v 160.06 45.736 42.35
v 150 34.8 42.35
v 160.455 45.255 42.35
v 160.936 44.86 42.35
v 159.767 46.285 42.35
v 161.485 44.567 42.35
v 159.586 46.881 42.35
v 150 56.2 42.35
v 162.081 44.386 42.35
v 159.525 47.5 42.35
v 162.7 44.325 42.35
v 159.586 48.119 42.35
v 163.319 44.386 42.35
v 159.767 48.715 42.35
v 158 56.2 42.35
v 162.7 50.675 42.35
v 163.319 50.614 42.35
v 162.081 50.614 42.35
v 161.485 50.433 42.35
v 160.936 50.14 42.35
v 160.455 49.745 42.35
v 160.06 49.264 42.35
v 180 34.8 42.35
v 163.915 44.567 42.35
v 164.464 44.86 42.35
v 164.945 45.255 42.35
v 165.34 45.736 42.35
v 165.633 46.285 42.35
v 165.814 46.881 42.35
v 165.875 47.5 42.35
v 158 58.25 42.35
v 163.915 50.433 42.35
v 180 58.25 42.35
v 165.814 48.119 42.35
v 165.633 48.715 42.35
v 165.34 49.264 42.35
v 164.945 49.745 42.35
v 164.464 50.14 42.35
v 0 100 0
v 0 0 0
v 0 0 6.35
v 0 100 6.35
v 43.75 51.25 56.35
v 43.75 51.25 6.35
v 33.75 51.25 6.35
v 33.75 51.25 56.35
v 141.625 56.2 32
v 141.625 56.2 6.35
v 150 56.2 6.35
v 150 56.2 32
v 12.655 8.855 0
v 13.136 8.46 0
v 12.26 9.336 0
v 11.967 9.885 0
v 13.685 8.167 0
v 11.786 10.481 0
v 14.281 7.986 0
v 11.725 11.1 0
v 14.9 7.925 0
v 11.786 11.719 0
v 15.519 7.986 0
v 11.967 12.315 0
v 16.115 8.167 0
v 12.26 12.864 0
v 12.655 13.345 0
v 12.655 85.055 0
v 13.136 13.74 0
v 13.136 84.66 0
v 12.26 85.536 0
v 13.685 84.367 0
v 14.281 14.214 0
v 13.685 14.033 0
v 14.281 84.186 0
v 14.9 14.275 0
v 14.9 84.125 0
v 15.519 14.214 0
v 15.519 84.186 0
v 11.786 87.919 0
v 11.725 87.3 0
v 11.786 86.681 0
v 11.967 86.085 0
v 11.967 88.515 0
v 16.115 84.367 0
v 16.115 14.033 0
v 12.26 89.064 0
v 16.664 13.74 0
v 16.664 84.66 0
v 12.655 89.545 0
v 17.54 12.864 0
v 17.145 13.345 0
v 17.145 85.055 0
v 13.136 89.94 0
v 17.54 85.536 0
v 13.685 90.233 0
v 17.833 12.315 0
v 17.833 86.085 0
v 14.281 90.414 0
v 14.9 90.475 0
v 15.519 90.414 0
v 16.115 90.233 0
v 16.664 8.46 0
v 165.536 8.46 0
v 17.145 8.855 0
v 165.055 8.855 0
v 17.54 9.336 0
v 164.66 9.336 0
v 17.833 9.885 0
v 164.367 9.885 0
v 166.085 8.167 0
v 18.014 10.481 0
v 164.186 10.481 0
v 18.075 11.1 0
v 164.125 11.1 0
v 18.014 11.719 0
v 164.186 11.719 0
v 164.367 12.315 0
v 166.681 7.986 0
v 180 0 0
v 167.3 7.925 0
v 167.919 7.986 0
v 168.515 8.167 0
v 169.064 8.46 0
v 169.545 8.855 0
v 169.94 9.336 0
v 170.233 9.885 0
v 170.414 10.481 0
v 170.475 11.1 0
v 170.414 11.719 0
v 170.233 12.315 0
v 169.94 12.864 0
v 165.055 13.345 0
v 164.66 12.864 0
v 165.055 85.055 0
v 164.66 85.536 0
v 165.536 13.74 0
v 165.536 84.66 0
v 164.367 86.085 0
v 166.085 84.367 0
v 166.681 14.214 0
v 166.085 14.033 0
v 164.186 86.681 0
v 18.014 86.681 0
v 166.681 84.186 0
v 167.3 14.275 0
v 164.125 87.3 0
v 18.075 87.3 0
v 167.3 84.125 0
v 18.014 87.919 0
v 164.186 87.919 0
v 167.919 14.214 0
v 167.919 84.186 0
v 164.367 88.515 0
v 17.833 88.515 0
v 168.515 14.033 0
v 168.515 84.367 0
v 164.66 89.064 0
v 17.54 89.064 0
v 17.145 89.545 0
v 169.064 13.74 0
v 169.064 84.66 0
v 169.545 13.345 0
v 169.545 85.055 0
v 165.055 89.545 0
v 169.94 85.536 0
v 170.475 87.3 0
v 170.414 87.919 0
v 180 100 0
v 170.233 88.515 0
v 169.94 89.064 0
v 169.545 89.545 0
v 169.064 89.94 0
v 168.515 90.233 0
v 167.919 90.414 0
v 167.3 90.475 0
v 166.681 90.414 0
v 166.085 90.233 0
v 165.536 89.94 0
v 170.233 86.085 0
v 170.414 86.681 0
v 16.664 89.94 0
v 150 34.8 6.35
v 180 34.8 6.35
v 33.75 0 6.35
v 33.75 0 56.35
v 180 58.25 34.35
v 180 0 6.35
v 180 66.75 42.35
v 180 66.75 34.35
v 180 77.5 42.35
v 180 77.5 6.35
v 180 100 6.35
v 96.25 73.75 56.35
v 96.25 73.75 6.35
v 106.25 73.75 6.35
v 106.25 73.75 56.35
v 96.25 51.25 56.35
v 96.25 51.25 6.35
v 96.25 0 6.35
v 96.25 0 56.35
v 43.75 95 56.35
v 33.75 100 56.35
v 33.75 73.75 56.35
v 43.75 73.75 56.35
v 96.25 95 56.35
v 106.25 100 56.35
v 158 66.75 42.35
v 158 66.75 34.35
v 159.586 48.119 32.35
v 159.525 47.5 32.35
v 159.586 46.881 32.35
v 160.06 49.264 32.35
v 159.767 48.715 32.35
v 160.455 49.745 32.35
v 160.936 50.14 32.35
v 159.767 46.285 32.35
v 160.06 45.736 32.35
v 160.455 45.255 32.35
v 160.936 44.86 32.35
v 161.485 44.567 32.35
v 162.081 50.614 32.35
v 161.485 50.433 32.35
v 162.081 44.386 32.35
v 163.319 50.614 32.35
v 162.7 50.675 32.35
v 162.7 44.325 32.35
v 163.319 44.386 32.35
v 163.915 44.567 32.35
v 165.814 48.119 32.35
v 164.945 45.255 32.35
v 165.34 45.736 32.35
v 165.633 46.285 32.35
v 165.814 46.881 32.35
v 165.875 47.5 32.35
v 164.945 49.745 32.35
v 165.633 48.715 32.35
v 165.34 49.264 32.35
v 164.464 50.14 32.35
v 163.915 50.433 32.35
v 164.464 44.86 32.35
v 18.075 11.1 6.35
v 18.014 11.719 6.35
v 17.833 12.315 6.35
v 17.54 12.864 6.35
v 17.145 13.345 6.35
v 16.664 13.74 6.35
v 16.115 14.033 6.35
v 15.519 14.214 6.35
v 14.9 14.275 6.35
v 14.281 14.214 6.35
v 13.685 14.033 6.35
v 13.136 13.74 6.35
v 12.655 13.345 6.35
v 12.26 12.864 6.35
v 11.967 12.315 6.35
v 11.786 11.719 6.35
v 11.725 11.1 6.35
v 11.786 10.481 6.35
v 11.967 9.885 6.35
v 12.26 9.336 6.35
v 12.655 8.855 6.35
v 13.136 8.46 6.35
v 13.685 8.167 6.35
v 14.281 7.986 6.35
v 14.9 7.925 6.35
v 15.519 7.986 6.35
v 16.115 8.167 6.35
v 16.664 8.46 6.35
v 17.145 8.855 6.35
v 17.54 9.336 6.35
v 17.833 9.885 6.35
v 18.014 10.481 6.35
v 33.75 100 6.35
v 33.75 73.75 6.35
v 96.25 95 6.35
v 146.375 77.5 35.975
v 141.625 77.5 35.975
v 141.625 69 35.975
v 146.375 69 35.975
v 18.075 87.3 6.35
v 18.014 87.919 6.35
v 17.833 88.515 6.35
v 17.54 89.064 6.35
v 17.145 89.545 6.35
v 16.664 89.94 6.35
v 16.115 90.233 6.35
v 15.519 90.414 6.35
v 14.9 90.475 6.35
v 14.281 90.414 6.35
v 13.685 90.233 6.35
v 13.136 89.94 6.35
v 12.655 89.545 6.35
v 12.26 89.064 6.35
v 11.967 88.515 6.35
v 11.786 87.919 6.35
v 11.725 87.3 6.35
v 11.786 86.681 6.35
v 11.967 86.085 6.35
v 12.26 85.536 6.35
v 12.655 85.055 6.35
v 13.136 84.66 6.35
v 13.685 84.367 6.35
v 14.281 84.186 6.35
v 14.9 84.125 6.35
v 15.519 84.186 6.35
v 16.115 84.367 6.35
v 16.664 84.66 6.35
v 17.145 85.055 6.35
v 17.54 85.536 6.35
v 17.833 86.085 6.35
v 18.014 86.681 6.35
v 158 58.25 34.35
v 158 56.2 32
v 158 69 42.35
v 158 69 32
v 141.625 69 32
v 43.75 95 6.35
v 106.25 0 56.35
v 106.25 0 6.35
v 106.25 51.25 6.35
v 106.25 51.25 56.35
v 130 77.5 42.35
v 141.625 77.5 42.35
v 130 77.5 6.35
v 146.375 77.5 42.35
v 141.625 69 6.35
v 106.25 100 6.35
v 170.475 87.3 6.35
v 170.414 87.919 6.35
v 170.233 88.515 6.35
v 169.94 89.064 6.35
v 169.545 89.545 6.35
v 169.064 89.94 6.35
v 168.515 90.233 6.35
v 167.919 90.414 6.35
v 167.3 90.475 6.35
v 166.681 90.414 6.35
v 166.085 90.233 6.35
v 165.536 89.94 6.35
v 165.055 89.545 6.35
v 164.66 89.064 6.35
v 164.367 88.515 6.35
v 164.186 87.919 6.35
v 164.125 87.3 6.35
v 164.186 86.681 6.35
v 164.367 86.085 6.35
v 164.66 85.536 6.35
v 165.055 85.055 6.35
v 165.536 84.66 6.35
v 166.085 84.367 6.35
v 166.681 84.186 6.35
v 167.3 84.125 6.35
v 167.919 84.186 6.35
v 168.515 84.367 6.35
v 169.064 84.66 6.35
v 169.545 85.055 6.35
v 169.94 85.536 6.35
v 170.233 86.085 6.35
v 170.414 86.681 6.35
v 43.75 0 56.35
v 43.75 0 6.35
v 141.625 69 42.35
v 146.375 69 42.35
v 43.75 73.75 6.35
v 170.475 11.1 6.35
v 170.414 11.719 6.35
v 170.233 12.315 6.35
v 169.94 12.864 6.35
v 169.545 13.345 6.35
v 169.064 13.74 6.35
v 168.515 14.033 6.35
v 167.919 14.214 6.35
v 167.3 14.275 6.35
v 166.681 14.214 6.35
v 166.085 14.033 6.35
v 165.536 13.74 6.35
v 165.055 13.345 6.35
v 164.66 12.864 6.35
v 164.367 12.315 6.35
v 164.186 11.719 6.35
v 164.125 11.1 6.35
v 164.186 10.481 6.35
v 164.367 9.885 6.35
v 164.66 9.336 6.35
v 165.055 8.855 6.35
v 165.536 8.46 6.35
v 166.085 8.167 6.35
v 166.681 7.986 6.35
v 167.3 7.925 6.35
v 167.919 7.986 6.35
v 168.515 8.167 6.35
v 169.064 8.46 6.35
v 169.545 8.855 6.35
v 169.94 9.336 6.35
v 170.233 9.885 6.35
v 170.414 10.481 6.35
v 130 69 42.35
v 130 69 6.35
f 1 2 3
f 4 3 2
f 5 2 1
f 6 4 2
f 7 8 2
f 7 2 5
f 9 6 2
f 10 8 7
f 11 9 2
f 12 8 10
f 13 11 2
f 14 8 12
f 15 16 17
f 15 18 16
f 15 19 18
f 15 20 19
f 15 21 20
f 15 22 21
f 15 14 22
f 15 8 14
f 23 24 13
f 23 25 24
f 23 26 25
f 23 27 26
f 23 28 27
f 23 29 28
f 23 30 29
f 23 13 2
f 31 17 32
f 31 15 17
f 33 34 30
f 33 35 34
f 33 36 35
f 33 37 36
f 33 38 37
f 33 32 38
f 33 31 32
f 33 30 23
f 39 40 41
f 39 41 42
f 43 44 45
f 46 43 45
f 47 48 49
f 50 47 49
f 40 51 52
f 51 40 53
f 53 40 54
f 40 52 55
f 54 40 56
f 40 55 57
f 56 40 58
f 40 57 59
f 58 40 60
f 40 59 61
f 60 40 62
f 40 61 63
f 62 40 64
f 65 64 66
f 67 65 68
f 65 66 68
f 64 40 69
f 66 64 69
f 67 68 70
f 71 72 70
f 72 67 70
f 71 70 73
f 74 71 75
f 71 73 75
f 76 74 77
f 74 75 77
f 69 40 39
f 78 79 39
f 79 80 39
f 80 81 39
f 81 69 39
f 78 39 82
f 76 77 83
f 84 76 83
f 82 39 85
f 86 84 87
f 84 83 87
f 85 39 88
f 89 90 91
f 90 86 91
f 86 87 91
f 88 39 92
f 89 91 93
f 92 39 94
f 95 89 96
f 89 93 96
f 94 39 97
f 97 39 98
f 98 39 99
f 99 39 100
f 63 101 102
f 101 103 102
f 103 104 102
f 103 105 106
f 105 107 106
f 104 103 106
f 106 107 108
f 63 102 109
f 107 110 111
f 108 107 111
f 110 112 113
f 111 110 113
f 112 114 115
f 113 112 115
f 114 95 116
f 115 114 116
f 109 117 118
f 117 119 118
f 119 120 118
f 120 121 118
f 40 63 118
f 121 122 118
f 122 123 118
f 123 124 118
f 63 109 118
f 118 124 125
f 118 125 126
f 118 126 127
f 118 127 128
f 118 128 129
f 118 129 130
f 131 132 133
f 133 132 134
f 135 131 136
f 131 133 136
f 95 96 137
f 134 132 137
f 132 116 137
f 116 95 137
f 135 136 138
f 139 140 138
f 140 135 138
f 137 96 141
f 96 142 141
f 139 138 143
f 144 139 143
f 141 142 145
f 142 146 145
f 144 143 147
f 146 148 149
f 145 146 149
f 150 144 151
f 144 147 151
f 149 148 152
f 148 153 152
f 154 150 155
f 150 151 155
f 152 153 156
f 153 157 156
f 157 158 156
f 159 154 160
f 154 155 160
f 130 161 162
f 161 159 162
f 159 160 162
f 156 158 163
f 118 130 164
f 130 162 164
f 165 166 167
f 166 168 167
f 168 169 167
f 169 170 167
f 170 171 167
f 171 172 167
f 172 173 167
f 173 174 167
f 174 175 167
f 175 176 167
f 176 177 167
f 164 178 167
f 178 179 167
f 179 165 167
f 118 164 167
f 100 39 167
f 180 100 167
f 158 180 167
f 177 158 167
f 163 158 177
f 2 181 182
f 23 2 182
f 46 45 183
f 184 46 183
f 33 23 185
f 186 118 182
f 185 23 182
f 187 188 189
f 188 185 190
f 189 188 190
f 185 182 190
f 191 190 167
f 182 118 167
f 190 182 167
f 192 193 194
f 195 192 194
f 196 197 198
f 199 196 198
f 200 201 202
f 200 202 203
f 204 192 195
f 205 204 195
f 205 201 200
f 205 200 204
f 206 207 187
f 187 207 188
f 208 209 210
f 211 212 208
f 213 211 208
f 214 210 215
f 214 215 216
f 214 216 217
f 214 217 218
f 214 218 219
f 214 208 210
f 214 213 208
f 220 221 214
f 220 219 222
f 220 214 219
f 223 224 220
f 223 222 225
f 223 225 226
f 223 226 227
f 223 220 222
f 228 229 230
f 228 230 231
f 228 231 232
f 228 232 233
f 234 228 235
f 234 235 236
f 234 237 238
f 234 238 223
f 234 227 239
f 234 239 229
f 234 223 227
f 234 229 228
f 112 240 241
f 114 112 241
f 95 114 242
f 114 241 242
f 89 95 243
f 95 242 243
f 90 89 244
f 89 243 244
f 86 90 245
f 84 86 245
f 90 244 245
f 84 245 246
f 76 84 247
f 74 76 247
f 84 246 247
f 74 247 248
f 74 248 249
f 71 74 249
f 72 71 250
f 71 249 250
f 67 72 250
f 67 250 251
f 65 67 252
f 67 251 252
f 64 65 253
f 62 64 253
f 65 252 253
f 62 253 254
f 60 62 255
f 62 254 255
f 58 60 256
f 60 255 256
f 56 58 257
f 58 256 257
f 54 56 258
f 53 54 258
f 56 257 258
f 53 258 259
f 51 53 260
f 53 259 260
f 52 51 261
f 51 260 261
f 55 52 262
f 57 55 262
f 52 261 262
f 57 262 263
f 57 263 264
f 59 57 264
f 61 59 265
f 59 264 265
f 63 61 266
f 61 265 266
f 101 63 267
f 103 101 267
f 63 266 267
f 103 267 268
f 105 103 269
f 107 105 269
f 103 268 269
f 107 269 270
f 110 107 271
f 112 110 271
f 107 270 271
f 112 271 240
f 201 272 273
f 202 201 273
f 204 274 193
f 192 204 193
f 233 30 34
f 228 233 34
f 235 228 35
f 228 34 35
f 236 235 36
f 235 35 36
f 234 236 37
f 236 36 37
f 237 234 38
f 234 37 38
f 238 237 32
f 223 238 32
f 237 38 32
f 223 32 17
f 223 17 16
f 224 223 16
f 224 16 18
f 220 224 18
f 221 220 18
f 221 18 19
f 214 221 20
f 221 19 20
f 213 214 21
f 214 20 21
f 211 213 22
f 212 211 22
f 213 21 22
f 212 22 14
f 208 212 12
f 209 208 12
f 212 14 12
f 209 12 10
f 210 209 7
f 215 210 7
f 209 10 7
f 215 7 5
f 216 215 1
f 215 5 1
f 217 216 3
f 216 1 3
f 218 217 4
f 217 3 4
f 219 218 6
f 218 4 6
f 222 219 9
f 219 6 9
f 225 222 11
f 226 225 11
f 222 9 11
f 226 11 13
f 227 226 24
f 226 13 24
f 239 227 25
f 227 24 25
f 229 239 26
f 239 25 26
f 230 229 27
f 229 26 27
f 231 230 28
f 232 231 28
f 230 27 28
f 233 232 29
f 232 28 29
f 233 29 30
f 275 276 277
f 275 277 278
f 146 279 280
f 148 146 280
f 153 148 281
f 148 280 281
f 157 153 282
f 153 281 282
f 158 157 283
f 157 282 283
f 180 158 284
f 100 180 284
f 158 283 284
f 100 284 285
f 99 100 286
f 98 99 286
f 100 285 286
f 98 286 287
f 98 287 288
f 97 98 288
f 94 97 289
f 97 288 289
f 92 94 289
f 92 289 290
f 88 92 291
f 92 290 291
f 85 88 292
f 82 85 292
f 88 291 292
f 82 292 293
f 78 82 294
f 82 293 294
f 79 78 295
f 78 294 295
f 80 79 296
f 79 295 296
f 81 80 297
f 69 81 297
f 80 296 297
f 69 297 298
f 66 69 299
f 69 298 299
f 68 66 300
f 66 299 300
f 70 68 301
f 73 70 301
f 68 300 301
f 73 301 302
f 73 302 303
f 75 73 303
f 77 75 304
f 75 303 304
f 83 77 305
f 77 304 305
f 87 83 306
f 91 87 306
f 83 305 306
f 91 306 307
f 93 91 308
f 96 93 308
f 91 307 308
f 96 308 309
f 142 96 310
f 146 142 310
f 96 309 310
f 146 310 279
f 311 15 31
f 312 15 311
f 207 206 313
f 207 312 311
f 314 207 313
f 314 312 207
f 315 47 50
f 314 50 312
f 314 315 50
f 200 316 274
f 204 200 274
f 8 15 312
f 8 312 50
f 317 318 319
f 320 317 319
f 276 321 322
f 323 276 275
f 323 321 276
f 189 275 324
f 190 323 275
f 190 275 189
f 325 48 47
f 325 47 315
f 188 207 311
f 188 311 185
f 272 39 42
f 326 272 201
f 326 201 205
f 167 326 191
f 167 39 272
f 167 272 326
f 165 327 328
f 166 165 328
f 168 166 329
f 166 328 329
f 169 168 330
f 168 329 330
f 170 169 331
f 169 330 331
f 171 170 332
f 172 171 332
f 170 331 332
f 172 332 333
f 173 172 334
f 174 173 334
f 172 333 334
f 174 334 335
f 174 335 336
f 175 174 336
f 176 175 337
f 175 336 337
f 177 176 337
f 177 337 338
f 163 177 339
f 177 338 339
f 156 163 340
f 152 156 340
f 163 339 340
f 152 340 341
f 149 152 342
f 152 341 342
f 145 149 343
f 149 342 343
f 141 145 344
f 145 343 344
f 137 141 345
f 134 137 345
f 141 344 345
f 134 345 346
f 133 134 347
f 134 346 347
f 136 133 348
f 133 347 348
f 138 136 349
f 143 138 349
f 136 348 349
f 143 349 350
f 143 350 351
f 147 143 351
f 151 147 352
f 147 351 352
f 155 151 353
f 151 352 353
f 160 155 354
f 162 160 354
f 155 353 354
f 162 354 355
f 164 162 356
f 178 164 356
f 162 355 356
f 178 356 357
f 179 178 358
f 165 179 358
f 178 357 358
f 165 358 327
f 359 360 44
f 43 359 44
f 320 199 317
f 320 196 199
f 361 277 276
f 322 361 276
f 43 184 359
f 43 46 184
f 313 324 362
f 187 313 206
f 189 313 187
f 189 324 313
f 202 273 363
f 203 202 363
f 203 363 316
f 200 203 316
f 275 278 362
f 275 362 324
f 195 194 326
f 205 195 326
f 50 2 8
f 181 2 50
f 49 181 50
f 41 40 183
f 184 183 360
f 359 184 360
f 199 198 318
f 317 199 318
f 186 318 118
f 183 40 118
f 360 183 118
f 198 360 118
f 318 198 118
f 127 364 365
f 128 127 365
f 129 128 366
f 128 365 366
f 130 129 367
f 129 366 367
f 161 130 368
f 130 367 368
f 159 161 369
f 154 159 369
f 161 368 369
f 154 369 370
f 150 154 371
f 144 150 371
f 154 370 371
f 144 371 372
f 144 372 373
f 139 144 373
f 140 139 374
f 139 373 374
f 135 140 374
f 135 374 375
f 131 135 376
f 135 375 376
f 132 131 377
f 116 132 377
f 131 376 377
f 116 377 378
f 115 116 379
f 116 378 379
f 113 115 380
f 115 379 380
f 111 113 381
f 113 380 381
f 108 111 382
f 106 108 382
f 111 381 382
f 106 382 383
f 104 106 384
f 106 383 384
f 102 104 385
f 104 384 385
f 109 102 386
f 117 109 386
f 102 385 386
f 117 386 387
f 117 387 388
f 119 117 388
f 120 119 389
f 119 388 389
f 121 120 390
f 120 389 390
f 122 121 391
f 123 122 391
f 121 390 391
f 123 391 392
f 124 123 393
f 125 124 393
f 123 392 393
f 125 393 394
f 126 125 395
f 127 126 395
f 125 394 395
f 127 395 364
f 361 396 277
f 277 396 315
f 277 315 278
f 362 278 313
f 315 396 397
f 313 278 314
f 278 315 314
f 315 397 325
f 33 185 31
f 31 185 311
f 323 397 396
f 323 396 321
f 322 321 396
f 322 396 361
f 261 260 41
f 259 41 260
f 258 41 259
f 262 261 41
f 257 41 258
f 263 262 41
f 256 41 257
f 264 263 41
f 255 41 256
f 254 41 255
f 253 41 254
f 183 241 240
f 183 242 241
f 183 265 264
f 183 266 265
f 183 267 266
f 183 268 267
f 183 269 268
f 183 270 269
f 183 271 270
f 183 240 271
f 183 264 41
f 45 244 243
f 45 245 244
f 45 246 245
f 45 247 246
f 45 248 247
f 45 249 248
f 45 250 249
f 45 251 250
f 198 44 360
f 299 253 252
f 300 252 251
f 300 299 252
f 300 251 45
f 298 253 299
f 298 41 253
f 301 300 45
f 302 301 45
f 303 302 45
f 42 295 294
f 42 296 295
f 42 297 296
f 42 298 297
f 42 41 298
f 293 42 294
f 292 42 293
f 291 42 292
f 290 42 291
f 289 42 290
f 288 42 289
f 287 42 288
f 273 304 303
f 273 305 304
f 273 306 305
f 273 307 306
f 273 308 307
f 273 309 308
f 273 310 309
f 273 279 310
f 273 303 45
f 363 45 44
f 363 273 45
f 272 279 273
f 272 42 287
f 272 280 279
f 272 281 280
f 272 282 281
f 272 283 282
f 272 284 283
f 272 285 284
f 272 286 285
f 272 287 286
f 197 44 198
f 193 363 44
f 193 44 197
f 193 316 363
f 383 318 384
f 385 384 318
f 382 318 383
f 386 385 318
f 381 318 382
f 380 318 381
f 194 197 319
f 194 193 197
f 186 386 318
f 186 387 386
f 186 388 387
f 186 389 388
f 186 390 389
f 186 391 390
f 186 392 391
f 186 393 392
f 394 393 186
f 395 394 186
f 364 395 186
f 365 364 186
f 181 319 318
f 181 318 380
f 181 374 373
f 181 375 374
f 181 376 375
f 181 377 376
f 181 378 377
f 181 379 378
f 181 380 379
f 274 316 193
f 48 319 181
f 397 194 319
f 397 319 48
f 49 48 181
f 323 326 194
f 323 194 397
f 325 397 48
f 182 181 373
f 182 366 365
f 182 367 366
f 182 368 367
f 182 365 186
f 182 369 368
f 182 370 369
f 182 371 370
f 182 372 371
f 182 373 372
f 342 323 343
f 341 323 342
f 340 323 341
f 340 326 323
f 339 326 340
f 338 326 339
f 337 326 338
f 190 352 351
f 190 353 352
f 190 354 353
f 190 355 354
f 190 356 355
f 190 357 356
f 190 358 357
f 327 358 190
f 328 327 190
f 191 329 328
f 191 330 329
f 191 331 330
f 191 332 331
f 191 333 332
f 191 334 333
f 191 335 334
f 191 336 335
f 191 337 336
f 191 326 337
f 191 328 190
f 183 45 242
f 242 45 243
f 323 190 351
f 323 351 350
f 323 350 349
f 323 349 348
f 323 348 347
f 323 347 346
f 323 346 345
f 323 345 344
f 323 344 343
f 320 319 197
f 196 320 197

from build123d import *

# Parameters (mm, degrees)
SKETCH1_W            = 180
SKETCH1_H            = 100
BOSS_EXTRUDE1_DEPTH  = 6.35
SKETCH2_W            = 26.25
SKETCH2_H            = 5
BOSS_EXTRUDE3_DEPTH  = 50
SKETCH3_W            = 30
SKETCH3_H            = 30
BOSS_EXTRUDE4_DEPTH  = 25.65
BOSS_EXTRUDE5_DEPTH  = 10.35
SKETCH5_W            = 22
SKETCH5_H            = 8.5
BOSS_EXTRUDE6_DEPTH  = 2.35
SKETCH6_W            = 20
SKETCH6_H            = 8.5
BOSS_EXTRUDE7_DEPTH  = 29.625
SKETCH8_W            = 3.625
SKETCH8_H            = 8.5
SKETCH8_W_2          = 11.625
BOSS_EXTRUDE8_DEPTH  = 6.375
SKETCH9_W            = 8.375
SKETCH9_H            = 12.8
BOSS_EXTRUDE9_DEPTH  = 25.65
SKETCH10_R           = 3.175
CUT_EXTRUDE1_DEPTH   = 6.35
SKETCH11_W           = 30
SKETCH11_H           = 12.7
BOSS_EXTRUDE10_DEPTH = 36
SKETCH12_R           = 3.175
CUT_EXTRUDE2_DEPTH   = 10


with BuildPart() as part:
    # Sketch1 → Boss-Extrude1 (new body)
    with BuildSketch(Plane.XY):
        with Locations((90, 50)):
            Rectangle(SKETCH1_W, SKETCH1_H)
    extrude(amount=BOSS_EXTRUDE1_DEPTH)

    # Sketch2 → Boss-Extrude3 (add)
    with BuildSketch(Plane.XY.offset(6.35)):
        Polygon((43.75, 95), (43.75, 100), (33.75, 100), (33.75, 73.75), (43.75, 73.75), align=None)
        with Locations((56.875, 97.5)):
            Rectangle(SKETCH2_W, SKETCH2_H)
        with Locations((83.125, 97.5)):
            Rectangle(SKETCH2_W, SKETCH2_H)
        Polygon((106.25, 100), (96.25, 100), (96.25, 95), (96.25, 73.75), (106.25, 73.75), align=None)
        Polygon((33.75, 0), (43.75, 0), (43.75, 5), (43.75, 51.25), (33.75, 51.25), align=None)
        Polygon((96.25, 5), (96.25, 0), (106.25, 0), (106.25, 51.25), (96.25, 51.25), align=None)
    extrude(amount=BOSS_EXTRUDE3_DEPTH)

    # Sketch3 → Boss-Extrude4 (add)
    with BuildSketch(Plane.XY.offset(6.35)):
        with Locations((165, 62.5)):
            Rectangle(SKETCH3_W, SKETCH3_H)
    extrude(amount=BOSS_EXTRUDE4_DEPTH)

    # Sketch4 → Boss-Extrude5 (add)
    with BuildSketch(Plane.XY.offset(32)):
        Polygon((150, 77.5), (150, 69), (158, 69), (158, 66.75), (180, 66.75), (180, 77.5), align=None)
        Polygon((158, 56.2), (150, 56.2), (150, 47.5), (180, 47.5), (180, 58.25), (158, 58.25), align=None)
    extrude(amount=BOSS_EXTRUDE5_DEPTH)

    # Sketch5 → Boss-Extrude6 (add)
    with BuildSketch(Plane.XY.offset(32)):
        with Locations((169, 62.5)):
            Rectangle(SKETCH5_W, SKETCH5_H)
    extrude(amount=BOSS_EXTRUDE6_DEPTH)

    # Sketch6 → Boss-Extrude7 (add)
    with BuildSketch(Plane.XY.offset(6.35)):
        with Locations((140, 73.25)):
            Rectangle(SKETCH6_W, SKETCH6_H)
    extrude(amount=BOSS_EXTRUDE7_DEPTH)

    # Sketch8 → Boss-Extrude8 (add)
    with BuildSketch(Plane.XY.offset(35.975)):
        with Locations((148.1875, 73.25)):
            Rectangle(SKETCH8_W, SKETCH8_H)
        with Locations((135.8125, 73.25)):
            Rectangle(SKETCH8_W_2, SKETCH8_H)
    extrude(amount=BOSS_EXTRUDE8_DEPTH)

    # Sketch9 → Boss-Extrude9 (add)
    with BuildSketch(Plane.XY.offset(6.35)):
        with Locations((145.8125, 62.6)):
            Rectangle(SKETCH9_W, SKETCH9_H)
    extrude(amount=BOSS_EXTRUDE9_DEPTH)

    # Sketch10 → Cut-Extrude1 (cut)
    with BuildSketch(Plane.XY.offset(6.35)):
        with Locations((14.9, 87.3)):
            Circle(SKETCH10_R)
        with Locations((167.3, 87.3)):
            Circle(SKETCH10_R)
        with Locations((167.3, 11.1)):
            Circle(SKETCH10_R)
        with Locations((14.9, 11.1)):
            Circle(SKETCH10_R)
    extrude(amount=-CUT_EXTRUDE1_DEPTH, mode=Mode.SUBTRACT)

    # Sketch11 → Boss-Extrude10 (add)
    with BuildSketch(Plane.XY.offset(6.35)):
        with Locations((165, 41.15)):
            Rectangle(SKETCH11_W, SKETCH11_H)
    extrude(amount=BOSS_EXTRUDE10_DEPTH)

    # Sketch12 → Cut-Extrude2 (cut)
    with BuildSketch(Plane.XY.offset(42.35)):
        with Locations((162.7, 47.5)):
            Circle(SKETCH12_R)
    extrude(amount=-CUT_EXTRUDE2_DEPTH, mode=Mode.SUBTRACT)


solid = part.part
